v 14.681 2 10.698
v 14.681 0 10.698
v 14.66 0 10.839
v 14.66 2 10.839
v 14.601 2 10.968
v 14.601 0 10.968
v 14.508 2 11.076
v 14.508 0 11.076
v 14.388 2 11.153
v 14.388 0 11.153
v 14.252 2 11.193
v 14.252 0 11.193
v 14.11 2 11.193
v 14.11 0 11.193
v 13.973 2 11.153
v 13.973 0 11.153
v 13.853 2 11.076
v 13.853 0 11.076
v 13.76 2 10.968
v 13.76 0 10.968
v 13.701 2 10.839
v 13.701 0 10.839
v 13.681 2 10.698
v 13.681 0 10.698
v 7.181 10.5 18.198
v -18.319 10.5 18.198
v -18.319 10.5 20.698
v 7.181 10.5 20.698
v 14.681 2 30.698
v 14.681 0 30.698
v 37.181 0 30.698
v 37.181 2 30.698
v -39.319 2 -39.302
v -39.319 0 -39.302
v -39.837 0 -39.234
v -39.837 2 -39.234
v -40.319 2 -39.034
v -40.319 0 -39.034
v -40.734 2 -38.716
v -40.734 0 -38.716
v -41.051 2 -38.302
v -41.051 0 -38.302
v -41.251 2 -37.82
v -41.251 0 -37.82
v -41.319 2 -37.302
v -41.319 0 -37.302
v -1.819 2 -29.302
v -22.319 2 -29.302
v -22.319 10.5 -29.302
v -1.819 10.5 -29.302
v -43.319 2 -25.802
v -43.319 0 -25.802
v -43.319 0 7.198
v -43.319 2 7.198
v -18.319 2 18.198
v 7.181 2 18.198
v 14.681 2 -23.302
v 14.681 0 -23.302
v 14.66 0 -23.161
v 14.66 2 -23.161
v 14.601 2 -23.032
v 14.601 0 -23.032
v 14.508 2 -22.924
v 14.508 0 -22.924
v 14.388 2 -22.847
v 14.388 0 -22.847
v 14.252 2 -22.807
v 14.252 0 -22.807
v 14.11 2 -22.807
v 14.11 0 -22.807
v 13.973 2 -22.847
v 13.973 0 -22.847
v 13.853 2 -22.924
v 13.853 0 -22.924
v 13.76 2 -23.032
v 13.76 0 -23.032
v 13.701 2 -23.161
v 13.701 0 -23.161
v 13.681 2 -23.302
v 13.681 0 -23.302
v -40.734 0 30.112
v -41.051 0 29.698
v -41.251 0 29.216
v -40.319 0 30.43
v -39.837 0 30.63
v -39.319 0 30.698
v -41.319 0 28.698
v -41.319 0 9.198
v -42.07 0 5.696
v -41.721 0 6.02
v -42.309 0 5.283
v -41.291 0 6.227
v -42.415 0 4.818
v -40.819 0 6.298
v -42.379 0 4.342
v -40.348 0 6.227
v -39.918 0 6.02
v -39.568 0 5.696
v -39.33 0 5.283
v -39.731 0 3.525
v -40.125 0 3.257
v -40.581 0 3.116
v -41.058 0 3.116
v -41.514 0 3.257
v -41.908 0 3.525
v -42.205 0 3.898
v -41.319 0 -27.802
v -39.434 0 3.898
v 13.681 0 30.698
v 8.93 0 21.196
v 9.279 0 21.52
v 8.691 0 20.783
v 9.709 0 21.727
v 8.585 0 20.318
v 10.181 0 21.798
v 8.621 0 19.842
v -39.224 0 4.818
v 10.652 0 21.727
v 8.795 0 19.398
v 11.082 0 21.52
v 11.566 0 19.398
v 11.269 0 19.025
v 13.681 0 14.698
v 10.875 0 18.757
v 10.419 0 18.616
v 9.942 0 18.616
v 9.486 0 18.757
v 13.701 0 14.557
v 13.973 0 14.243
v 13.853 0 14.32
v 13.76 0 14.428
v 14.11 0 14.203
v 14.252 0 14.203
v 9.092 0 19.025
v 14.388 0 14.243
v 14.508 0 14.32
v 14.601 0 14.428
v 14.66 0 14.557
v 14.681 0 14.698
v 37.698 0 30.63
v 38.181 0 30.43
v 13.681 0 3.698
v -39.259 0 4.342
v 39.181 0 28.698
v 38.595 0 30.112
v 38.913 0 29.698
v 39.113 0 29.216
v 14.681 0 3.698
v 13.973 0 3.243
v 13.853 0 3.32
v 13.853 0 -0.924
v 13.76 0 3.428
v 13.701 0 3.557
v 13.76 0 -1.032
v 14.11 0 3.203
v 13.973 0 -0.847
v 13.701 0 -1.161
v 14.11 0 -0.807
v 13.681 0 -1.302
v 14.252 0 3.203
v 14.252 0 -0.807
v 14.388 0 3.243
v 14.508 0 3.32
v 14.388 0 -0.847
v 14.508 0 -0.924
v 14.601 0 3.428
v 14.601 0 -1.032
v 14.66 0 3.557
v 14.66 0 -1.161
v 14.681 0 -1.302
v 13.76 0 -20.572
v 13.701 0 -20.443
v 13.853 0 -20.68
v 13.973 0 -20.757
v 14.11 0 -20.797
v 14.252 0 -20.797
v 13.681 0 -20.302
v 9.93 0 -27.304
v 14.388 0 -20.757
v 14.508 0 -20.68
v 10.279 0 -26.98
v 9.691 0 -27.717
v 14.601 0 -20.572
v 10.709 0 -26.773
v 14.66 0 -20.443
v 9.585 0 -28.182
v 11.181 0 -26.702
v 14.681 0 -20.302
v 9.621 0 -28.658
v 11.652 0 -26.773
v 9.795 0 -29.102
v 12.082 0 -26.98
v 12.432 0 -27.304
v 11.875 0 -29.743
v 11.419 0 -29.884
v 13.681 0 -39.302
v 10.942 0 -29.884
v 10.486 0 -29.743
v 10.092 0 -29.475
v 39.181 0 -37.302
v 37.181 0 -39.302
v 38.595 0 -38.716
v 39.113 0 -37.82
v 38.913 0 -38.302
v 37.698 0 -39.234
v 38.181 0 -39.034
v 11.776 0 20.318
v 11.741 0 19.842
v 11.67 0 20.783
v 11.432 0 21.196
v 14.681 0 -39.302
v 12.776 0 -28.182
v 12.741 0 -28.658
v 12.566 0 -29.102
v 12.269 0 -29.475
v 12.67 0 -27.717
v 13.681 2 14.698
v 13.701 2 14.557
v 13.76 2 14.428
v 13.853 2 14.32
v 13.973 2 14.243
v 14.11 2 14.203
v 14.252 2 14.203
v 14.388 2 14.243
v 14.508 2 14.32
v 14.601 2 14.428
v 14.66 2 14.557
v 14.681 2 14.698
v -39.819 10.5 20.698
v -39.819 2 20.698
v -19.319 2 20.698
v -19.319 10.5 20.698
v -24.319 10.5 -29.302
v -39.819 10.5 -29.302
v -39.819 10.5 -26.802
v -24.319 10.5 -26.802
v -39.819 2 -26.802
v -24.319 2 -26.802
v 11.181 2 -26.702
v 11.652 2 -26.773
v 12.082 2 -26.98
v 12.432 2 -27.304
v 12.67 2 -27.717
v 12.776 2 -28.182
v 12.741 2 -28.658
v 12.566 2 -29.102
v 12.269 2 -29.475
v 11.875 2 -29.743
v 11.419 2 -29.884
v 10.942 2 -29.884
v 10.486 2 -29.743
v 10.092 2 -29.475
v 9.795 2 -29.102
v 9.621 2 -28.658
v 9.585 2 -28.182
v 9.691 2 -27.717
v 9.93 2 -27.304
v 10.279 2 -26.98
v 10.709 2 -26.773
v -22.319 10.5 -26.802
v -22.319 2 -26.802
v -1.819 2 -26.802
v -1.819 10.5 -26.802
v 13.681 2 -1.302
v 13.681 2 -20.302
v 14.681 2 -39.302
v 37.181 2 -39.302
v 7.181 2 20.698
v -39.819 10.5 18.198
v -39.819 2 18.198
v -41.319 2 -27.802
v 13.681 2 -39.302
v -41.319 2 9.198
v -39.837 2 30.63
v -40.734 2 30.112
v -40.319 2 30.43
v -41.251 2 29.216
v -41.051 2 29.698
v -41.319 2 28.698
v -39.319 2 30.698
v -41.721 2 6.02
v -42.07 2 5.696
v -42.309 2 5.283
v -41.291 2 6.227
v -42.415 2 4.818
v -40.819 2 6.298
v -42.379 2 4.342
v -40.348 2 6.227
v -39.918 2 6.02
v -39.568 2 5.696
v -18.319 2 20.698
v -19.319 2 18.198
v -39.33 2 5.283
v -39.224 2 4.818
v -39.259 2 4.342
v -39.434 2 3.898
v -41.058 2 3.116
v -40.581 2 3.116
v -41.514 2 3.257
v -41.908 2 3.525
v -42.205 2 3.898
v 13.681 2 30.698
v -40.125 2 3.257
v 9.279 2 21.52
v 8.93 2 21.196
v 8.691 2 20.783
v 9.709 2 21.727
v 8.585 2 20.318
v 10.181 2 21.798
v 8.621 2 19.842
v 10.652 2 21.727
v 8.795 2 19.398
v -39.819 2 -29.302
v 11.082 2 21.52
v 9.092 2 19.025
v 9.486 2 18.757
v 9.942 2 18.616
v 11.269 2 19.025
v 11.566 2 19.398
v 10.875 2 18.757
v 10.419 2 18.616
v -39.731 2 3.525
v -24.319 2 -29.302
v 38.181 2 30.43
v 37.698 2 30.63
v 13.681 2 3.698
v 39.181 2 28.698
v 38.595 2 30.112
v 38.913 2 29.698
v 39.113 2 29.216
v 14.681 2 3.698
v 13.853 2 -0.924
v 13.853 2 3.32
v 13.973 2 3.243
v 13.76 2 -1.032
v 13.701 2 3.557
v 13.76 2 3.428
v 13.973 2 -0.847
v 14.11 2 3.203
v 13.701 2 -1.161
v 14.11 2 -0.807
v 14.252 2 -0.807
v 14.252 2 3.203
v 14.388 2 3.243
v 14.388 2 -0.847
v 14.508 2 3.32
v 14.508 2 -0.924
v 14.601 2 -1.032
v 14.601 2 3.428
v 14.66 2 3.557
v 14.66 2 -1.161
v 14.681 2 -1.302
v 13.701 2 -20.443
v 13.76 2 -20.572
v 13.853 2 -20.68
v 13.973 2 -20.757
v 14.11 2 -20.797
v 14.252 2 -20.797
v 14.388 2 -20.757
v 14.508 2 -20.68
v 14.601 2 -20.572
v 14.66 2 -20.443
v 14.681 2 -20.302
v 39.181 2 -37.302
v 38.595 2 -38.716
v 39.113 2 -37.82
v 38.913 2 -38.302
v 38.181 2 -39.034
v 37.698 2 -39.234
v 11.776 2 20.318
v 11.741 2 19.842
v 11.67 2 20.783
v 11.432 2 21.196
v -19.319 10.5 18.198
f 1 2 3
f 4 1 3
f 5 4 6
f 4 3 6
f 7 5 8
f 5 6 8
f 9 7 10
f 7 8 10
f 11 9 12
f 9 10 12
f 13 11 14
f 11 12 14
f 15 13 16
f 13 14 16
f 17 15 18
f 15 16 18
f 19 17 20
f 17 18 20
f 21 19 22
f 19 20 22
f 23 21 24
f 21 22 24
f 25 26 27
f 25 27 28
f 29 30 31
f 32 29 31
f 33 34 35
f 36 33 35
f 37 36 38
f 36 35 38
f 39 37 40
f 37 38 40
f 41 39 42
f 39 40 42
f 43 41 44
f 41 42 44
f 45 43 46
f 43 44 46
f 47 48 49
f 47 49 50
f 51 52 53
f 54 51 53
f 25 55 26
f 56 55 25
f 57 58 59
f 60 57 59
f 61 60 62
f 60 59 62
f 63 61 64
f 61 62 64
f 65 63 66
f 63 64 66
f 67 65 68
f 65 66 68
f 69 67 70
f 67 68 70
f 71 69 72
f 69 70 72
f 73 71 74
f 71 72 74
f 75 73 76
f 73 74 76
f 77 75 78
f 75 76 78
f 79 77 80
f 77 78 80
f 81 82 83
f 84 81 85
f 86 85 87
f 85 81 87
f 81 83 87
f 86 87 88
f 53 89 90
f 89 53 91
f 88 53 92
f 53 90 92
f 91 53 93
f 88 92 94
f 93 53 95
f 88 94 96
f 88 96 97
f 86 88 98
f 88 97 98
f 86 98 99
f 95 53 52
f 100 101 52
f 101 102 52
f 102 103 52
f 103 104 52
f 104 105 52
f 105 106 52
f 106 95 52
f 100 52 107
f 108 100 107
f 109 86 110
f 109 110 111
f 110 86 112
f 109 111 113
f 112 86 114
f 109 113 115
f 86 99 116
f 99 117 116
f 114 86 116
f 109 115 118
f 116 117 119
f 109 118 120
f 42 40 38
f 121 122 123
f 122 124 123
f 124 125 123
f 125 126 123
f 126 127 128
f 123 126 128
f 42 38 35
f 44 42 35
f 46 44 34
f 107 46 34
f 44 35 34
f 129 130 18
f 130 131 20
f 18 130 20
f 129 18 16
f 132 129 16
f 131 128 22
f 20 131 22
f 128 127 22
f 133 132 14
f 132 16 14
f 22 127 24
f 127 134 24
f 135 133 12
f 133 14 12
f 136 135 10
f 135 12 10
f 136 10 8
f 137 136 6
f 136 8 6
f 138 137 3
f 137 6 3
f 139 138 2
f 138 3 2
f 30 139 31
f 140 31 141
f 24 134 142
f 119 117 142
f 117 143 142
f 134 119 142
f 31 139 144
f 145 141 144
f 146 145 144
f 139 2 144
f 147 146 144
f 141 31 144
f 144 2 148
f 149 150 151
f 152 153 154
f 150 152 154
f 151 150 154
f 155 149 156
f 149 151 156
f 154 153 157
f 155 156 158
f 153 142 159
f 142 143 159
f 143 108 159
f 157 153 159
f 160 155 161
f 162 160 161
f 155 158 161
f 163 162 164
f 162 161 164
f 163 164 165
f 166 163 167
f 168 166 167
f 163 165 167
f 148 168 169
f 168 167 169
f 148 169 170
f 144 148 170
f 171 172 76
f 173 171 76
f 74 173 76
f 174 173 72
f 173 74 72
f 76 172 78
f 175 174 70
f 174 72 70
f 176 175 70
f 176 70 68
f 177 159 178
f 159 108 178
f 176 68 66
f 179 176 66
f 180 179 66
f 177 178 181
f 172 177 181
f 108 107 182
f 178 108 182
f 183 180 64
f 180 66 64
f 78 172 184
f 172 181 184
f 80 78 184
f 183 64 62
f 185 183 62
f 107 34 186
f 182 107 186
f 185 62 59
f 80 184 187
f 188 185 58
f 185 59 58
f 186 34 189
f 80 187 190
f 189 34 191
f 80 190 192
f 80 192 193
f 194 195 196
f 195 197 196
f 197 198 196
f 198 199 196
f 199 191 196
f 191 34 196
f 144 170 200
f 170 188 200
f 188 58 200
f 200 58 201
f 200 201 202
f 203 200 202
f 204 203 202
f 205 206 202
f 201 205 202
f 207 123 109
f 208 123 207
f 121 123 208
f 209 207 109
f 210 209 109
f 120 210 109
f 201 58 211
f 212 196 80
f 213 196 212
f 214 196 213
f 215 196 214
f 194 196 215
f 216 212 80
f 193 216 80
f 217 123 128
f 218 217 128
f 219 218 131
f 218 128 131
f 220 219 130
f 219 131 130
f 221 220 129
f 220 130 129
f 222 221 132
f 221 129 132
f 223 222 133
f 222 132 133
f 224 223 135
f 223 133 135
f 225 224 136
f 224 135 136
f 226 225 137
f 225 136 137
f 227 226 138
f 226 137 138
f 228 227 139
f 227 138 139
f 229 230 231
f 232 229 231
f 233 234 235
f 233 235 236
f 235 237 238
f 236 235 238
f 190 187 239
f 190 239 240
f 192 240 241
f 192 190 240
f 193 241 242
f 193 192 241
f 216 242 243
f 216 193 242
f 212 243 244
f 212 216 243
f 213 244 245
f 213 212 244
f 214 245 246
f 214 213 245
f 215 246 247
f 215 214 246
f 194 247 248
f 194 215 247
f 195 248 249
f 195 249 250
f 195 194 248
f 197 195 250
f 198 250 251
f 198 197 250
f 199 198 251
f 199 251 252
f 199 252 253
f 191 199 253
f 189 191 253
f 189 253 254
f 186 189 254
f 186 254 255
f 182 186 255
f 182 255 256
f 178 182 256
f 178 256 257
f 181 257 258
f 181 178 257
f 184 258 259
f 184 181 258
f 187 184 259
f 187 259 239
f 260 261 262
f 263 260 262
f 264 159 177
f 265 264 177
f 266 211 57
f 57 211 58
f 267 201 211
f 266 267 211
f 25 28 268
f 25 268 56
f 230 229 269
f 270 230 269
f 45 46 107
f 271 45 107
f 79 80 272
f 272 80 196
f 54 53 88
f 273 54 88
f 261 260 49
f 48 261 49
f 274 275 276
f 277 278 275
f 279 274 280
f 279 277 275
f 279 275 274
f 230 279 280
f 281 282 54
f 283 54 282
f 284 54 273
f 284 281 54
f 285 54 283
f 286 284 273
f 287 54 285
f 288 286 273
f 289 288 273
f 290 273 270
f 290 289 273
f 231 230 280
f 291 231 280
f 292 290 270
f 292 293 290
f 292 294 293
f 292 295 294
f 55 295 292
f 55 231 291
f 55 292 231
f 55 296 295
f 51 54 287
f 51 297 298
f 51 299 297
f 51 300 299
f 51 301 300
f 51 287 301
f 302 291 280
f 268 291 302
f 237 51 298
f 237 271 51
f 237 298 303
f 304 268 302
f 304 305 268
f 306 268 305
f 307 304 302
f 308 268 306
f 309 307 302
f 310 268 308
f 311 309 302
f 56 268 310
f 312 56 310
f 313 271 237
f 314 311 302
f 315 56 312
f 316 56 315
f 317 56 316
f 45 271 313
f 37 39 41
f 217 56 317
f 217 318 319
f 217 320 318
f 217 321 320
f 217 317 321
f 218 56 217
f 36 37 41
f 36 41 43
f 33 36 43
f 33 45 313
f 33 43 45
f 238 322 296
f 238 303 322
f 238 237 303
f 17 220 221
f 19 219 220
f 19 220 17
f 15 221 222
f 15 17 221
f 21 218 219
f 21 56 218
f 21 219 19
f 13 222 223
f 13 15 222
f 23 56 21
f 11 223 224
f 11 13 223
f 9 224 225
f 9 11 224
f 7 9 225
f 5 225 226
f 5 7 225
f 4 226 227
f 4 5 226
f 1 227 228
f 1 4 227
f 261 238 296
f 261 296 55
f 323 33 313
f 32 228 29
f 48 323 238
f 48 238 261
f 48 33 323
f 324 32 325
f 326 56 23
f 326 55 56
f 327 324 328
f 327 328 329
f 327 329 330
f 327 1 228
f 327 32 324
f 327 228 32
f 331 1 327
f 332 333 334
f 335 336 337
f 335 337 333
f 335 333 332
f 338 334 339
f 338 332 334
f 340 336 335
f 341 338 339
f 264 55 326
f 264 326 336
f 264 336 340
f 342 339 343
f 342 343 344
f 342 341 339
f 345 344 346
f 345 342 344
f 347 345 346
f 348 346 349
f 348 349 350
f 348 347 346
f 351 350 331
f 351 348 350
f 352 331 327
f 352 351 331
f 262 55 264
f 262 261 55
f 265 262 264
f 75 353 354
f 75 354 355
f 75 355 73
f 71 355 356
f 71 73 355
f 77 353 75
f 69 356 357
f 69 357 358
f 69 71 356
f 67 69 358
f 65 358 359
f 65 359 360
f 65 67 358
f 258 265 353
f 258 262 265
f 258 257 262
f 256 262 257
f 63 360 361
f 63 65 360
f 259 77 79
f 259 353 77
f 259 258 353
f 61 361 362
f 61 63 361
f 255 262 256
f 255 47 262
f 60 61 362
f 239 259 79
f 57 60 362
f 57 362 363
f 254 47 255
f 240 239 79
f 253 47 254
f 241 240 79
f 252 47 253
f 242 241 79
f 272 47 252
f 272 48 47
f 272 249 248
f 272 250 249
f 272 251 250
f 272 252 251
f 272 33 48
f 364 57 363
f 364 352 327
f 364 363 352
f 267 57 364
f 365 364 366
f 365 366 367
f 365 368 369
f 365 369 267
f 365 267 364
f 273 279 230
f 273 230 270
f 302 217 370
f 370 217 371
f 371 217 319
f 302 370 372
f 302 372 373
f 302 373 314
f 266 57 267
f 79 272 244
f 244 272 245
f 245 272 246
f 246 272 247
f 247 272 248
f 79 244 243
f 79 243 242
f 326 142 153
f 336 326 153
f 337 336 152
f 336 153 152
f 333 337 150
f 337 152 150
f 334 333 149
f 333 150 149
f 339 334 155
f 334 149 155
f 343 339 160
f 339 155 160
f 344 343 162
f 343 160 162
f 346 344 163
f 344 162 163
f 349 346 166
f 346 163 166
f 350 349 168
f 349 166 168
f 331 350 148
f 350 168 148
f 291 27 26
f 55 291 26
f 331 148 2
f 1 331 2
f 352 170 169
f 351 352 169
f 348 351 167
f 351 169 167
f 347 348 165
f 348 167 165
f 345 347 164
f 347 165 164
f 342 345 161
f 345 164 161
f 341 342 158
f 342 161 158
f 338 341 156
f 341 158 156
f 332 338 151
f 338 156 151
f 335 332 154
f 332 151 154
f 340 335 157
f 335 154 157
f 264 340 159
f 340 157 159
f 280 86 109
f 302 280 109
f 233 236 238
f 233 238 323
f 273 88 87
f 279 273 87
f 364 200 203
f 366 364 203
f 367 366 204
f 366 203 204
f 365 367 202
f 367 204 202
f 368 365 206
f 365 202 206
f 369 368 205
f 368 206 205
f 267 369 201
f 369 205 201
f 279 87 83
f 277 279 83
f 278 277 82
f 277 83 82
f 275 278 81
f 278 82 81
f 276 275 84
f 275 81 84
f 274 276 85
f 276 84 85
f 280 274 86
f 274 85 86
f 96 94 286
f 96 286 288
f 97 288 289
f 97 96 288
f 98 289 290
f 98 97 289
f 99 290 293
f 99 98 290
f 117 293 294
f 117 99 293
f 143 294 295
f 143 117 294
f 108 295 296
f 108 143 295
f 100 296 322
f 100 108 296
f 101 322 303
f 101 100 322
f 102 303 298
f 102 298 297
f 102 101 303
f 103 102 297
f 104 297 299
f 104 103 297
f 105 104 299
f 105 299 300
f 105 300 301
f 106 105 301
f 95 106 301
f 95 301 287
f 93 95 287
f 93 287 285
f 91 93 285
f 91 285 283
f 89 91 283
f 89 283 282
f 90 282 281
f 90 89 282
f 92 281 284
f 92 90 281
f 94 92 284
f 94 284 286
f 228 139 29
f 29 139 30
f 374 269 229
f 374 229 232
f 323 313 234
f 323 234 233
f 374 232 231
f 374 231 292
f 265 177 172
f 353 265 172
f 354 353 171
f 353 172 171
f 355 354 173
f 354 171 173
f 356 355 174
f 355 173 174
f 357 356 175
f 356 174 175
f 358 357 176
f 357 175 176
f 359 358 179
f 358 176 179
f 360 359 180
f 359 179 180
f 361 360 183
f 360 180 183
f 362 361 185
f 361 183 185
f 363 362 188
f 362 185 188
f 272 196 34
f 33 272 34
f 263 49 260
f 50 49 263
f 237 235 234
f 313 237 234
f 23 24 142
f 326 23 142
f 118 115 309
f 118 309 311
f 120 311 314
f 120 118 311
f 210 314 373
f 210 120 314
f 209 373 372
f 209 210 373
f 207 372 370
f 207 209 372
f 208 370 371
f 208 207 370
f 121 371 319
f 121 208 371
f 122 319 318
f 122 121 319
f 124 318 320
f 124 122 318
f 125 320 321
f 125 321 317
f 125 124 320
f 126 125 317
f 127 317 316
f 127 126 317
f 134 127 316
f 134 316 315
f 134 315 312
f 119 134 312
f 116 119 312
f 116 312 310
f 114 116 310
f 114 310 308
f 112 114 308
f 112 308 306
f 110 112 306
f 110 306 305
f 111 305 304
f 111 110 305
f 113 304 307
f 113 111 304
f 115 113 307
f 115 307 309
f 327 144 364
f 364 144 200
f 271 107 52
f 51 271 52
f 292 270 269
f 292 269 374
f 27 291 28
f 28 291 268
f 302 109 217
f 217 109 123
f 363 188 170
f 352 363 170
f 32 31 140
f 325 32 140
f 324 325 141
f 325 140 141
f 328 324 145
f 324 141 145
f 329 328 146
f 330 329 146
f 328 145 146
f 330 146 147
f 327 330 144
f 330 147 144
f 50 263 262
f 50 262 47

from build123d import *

# Parameters (mm, degrees)
SZKIC2_R                    = 1.6
DODANIE_WYCI_GNI_CIE1_DEPTH = 2
SZKIC3_W                    = 15.5
SZKIC3_H                    = 2.5
SZKIC3_W_2                  = 20.5
SZKIC3_W_3                  = 25.5
DODANIE_WYCI_GNI_CIE2_DEPTH = 8.5


with BuildPart() as part:
    # Szkic2 → Dodanie-wyciągnięcie1 (new body)
    with BuildSketch(Plane(origin=(0, 0, 0), x_dir=(1, 0, 0), z_dir=(0, 1, 0))):
        with BuildLine():
            Line((-43.319305218, 25.801941522), (-43.319305218, -7.198058478))
            Line((-43.319305218, -7.198058478), (-41.319305218, -9.198058478))
            Line((-41.319305218, -9.198058478), (-41.319305218, -28.698058478))
            ThreePointArc((-41.319305218, -28.698058478), (-40.73351878, -30.11227204), (-39.319305218, -30.698058478))
            Line((-39.319305218, -30.698058478), (13.680694782, -30.698058478))
            Line((13.680694782, -30.698058478), (13.680694782, -14.698058478))
            ThreePointArc((13.680694782, -14.698058478), (14.180694782, -14.198058478), (14.680694782, -14.698058478))
            Line((14.680694782, -14.698058478), (14.680694782, -30.698058478))
            Line((14.680694782, -30.698058478), (37.180694782, -30.698058478))
            ThreePointArc((37.180694782, -30.698058478), (38.594908344, -30.11227204), (39.180694782, -28.698058478))
            Line((39.180694782, -28.698058478), (39.180694782, 37.301941522))
            ThreePointArc((39.180694782, 37.301941522), (38.594908344, 38.716155084), (37.180694782, 39.301941522))
            Line((37.180694782, 39.301941522), (14.680694782, 39.301941522))
            Line((14.680694782, 39.301941522), (14.680694782, 23.301941522))
            ThreePointArc((14.680694782, 23.301941522), (14.180694782, 22.801941522), (13.680694782, 23.301941522))
            Line((13.680694782, 23.301941522), (13.680694782, 39.301941522))
            Line((13.680694782, 39.301941522), (-39.319305218, 39.301941522))
            ThreePointArc((-39.319305218, 39.301941522), (-40.73351878, 38.716155084), (-41.319305218, 37.301941522))
            Line((-41.319305218, 37.301941522), (-41.319305218, 27.801941522))
            Line((-41.319305218, 27.801941522), (-43.319305218, 25.801941522))
        make_face()
        with Locations(Location((-40.819305218, -4.698058478, 0), (0, 0, 270))):
            Circle(SZKIC2_R, mode=Mode.SUBTRACT)
        with Locations(Location((10.180694782, -20.198058478, 0), (0, 0, 270))):
            Circle(SZKIC2_R, mode=Mode.SUBTRACT)
        with BuildLine():
            ThreePointArc((13.680694782, -3.698058478), (14.180694782, -3.198058478), (14.680694782, -3.698058478))
            Line((14.680694782, -3.698058478), (14.680694782, -10.698058478))
            ThreePointArc((14.680694782, -10.698058478), (14.180694782, -11.198058478), (13.680694782, -10.698058478))
            Line((13.680694782, -10.698058478), (13.680694782, -3.698058478))
        make_face(mode=Mode.SUBTRACT)
        with BuildLine():
            ThreePointArc((13.680694782, 20.301941522), (14.180694782, 20.801941522), (14.680694782, 20.301941522))
            Line((14.680694782, 20.301941522), (14.680694782, 1.301941522))
            ThreePointArc((14.680694782, 1.301941522), (14.180694782, 0.801941522), (13.680694782, 1.301941522))
            Line((13.680694782, 1.301941522), (13.680694782, 20.301941522))
        make_face(mode=Mode.SUBTRACT)
        with Locations(Location((11.180694782, 28.301941522, 0), (0, 0, 270))):
            Circle(SZKIC2_R, mode=Mode.SUBTRACT)
    extrude(amount=DODANIE_WYCI_GNI_CIE1_DEPTH)

    # Szkic3 → Dodanie-wyciągnięcie2 (add)
    with BuildSketch(Plane(origin=(0, 2, 0), x_dir=(1, 0, 0), z_dir=(0, 1, 0))):
        with Locations((-32.069305218, 28.051941522)):
            Rectangle(SZKIC3_W, SZKIC3_H)
        with Locations((-12.069305218, 28.051941522)):
            Rectangle(SZKIC3_W_2, SZKIC3_H)
        with Locations((-29.569305218, -19.448058478)):
            Rectangle(SZKIC3_W_2, SZKIC3_H)
        with Locations((-5.569305218, -19.448058478)):
            Rectangle(SZKIC3_W_3, SZKIC3_H)
    extrude(amount=DODANIE_WYCI_GNI_CIE2_DEPTH)


solid = part.part
